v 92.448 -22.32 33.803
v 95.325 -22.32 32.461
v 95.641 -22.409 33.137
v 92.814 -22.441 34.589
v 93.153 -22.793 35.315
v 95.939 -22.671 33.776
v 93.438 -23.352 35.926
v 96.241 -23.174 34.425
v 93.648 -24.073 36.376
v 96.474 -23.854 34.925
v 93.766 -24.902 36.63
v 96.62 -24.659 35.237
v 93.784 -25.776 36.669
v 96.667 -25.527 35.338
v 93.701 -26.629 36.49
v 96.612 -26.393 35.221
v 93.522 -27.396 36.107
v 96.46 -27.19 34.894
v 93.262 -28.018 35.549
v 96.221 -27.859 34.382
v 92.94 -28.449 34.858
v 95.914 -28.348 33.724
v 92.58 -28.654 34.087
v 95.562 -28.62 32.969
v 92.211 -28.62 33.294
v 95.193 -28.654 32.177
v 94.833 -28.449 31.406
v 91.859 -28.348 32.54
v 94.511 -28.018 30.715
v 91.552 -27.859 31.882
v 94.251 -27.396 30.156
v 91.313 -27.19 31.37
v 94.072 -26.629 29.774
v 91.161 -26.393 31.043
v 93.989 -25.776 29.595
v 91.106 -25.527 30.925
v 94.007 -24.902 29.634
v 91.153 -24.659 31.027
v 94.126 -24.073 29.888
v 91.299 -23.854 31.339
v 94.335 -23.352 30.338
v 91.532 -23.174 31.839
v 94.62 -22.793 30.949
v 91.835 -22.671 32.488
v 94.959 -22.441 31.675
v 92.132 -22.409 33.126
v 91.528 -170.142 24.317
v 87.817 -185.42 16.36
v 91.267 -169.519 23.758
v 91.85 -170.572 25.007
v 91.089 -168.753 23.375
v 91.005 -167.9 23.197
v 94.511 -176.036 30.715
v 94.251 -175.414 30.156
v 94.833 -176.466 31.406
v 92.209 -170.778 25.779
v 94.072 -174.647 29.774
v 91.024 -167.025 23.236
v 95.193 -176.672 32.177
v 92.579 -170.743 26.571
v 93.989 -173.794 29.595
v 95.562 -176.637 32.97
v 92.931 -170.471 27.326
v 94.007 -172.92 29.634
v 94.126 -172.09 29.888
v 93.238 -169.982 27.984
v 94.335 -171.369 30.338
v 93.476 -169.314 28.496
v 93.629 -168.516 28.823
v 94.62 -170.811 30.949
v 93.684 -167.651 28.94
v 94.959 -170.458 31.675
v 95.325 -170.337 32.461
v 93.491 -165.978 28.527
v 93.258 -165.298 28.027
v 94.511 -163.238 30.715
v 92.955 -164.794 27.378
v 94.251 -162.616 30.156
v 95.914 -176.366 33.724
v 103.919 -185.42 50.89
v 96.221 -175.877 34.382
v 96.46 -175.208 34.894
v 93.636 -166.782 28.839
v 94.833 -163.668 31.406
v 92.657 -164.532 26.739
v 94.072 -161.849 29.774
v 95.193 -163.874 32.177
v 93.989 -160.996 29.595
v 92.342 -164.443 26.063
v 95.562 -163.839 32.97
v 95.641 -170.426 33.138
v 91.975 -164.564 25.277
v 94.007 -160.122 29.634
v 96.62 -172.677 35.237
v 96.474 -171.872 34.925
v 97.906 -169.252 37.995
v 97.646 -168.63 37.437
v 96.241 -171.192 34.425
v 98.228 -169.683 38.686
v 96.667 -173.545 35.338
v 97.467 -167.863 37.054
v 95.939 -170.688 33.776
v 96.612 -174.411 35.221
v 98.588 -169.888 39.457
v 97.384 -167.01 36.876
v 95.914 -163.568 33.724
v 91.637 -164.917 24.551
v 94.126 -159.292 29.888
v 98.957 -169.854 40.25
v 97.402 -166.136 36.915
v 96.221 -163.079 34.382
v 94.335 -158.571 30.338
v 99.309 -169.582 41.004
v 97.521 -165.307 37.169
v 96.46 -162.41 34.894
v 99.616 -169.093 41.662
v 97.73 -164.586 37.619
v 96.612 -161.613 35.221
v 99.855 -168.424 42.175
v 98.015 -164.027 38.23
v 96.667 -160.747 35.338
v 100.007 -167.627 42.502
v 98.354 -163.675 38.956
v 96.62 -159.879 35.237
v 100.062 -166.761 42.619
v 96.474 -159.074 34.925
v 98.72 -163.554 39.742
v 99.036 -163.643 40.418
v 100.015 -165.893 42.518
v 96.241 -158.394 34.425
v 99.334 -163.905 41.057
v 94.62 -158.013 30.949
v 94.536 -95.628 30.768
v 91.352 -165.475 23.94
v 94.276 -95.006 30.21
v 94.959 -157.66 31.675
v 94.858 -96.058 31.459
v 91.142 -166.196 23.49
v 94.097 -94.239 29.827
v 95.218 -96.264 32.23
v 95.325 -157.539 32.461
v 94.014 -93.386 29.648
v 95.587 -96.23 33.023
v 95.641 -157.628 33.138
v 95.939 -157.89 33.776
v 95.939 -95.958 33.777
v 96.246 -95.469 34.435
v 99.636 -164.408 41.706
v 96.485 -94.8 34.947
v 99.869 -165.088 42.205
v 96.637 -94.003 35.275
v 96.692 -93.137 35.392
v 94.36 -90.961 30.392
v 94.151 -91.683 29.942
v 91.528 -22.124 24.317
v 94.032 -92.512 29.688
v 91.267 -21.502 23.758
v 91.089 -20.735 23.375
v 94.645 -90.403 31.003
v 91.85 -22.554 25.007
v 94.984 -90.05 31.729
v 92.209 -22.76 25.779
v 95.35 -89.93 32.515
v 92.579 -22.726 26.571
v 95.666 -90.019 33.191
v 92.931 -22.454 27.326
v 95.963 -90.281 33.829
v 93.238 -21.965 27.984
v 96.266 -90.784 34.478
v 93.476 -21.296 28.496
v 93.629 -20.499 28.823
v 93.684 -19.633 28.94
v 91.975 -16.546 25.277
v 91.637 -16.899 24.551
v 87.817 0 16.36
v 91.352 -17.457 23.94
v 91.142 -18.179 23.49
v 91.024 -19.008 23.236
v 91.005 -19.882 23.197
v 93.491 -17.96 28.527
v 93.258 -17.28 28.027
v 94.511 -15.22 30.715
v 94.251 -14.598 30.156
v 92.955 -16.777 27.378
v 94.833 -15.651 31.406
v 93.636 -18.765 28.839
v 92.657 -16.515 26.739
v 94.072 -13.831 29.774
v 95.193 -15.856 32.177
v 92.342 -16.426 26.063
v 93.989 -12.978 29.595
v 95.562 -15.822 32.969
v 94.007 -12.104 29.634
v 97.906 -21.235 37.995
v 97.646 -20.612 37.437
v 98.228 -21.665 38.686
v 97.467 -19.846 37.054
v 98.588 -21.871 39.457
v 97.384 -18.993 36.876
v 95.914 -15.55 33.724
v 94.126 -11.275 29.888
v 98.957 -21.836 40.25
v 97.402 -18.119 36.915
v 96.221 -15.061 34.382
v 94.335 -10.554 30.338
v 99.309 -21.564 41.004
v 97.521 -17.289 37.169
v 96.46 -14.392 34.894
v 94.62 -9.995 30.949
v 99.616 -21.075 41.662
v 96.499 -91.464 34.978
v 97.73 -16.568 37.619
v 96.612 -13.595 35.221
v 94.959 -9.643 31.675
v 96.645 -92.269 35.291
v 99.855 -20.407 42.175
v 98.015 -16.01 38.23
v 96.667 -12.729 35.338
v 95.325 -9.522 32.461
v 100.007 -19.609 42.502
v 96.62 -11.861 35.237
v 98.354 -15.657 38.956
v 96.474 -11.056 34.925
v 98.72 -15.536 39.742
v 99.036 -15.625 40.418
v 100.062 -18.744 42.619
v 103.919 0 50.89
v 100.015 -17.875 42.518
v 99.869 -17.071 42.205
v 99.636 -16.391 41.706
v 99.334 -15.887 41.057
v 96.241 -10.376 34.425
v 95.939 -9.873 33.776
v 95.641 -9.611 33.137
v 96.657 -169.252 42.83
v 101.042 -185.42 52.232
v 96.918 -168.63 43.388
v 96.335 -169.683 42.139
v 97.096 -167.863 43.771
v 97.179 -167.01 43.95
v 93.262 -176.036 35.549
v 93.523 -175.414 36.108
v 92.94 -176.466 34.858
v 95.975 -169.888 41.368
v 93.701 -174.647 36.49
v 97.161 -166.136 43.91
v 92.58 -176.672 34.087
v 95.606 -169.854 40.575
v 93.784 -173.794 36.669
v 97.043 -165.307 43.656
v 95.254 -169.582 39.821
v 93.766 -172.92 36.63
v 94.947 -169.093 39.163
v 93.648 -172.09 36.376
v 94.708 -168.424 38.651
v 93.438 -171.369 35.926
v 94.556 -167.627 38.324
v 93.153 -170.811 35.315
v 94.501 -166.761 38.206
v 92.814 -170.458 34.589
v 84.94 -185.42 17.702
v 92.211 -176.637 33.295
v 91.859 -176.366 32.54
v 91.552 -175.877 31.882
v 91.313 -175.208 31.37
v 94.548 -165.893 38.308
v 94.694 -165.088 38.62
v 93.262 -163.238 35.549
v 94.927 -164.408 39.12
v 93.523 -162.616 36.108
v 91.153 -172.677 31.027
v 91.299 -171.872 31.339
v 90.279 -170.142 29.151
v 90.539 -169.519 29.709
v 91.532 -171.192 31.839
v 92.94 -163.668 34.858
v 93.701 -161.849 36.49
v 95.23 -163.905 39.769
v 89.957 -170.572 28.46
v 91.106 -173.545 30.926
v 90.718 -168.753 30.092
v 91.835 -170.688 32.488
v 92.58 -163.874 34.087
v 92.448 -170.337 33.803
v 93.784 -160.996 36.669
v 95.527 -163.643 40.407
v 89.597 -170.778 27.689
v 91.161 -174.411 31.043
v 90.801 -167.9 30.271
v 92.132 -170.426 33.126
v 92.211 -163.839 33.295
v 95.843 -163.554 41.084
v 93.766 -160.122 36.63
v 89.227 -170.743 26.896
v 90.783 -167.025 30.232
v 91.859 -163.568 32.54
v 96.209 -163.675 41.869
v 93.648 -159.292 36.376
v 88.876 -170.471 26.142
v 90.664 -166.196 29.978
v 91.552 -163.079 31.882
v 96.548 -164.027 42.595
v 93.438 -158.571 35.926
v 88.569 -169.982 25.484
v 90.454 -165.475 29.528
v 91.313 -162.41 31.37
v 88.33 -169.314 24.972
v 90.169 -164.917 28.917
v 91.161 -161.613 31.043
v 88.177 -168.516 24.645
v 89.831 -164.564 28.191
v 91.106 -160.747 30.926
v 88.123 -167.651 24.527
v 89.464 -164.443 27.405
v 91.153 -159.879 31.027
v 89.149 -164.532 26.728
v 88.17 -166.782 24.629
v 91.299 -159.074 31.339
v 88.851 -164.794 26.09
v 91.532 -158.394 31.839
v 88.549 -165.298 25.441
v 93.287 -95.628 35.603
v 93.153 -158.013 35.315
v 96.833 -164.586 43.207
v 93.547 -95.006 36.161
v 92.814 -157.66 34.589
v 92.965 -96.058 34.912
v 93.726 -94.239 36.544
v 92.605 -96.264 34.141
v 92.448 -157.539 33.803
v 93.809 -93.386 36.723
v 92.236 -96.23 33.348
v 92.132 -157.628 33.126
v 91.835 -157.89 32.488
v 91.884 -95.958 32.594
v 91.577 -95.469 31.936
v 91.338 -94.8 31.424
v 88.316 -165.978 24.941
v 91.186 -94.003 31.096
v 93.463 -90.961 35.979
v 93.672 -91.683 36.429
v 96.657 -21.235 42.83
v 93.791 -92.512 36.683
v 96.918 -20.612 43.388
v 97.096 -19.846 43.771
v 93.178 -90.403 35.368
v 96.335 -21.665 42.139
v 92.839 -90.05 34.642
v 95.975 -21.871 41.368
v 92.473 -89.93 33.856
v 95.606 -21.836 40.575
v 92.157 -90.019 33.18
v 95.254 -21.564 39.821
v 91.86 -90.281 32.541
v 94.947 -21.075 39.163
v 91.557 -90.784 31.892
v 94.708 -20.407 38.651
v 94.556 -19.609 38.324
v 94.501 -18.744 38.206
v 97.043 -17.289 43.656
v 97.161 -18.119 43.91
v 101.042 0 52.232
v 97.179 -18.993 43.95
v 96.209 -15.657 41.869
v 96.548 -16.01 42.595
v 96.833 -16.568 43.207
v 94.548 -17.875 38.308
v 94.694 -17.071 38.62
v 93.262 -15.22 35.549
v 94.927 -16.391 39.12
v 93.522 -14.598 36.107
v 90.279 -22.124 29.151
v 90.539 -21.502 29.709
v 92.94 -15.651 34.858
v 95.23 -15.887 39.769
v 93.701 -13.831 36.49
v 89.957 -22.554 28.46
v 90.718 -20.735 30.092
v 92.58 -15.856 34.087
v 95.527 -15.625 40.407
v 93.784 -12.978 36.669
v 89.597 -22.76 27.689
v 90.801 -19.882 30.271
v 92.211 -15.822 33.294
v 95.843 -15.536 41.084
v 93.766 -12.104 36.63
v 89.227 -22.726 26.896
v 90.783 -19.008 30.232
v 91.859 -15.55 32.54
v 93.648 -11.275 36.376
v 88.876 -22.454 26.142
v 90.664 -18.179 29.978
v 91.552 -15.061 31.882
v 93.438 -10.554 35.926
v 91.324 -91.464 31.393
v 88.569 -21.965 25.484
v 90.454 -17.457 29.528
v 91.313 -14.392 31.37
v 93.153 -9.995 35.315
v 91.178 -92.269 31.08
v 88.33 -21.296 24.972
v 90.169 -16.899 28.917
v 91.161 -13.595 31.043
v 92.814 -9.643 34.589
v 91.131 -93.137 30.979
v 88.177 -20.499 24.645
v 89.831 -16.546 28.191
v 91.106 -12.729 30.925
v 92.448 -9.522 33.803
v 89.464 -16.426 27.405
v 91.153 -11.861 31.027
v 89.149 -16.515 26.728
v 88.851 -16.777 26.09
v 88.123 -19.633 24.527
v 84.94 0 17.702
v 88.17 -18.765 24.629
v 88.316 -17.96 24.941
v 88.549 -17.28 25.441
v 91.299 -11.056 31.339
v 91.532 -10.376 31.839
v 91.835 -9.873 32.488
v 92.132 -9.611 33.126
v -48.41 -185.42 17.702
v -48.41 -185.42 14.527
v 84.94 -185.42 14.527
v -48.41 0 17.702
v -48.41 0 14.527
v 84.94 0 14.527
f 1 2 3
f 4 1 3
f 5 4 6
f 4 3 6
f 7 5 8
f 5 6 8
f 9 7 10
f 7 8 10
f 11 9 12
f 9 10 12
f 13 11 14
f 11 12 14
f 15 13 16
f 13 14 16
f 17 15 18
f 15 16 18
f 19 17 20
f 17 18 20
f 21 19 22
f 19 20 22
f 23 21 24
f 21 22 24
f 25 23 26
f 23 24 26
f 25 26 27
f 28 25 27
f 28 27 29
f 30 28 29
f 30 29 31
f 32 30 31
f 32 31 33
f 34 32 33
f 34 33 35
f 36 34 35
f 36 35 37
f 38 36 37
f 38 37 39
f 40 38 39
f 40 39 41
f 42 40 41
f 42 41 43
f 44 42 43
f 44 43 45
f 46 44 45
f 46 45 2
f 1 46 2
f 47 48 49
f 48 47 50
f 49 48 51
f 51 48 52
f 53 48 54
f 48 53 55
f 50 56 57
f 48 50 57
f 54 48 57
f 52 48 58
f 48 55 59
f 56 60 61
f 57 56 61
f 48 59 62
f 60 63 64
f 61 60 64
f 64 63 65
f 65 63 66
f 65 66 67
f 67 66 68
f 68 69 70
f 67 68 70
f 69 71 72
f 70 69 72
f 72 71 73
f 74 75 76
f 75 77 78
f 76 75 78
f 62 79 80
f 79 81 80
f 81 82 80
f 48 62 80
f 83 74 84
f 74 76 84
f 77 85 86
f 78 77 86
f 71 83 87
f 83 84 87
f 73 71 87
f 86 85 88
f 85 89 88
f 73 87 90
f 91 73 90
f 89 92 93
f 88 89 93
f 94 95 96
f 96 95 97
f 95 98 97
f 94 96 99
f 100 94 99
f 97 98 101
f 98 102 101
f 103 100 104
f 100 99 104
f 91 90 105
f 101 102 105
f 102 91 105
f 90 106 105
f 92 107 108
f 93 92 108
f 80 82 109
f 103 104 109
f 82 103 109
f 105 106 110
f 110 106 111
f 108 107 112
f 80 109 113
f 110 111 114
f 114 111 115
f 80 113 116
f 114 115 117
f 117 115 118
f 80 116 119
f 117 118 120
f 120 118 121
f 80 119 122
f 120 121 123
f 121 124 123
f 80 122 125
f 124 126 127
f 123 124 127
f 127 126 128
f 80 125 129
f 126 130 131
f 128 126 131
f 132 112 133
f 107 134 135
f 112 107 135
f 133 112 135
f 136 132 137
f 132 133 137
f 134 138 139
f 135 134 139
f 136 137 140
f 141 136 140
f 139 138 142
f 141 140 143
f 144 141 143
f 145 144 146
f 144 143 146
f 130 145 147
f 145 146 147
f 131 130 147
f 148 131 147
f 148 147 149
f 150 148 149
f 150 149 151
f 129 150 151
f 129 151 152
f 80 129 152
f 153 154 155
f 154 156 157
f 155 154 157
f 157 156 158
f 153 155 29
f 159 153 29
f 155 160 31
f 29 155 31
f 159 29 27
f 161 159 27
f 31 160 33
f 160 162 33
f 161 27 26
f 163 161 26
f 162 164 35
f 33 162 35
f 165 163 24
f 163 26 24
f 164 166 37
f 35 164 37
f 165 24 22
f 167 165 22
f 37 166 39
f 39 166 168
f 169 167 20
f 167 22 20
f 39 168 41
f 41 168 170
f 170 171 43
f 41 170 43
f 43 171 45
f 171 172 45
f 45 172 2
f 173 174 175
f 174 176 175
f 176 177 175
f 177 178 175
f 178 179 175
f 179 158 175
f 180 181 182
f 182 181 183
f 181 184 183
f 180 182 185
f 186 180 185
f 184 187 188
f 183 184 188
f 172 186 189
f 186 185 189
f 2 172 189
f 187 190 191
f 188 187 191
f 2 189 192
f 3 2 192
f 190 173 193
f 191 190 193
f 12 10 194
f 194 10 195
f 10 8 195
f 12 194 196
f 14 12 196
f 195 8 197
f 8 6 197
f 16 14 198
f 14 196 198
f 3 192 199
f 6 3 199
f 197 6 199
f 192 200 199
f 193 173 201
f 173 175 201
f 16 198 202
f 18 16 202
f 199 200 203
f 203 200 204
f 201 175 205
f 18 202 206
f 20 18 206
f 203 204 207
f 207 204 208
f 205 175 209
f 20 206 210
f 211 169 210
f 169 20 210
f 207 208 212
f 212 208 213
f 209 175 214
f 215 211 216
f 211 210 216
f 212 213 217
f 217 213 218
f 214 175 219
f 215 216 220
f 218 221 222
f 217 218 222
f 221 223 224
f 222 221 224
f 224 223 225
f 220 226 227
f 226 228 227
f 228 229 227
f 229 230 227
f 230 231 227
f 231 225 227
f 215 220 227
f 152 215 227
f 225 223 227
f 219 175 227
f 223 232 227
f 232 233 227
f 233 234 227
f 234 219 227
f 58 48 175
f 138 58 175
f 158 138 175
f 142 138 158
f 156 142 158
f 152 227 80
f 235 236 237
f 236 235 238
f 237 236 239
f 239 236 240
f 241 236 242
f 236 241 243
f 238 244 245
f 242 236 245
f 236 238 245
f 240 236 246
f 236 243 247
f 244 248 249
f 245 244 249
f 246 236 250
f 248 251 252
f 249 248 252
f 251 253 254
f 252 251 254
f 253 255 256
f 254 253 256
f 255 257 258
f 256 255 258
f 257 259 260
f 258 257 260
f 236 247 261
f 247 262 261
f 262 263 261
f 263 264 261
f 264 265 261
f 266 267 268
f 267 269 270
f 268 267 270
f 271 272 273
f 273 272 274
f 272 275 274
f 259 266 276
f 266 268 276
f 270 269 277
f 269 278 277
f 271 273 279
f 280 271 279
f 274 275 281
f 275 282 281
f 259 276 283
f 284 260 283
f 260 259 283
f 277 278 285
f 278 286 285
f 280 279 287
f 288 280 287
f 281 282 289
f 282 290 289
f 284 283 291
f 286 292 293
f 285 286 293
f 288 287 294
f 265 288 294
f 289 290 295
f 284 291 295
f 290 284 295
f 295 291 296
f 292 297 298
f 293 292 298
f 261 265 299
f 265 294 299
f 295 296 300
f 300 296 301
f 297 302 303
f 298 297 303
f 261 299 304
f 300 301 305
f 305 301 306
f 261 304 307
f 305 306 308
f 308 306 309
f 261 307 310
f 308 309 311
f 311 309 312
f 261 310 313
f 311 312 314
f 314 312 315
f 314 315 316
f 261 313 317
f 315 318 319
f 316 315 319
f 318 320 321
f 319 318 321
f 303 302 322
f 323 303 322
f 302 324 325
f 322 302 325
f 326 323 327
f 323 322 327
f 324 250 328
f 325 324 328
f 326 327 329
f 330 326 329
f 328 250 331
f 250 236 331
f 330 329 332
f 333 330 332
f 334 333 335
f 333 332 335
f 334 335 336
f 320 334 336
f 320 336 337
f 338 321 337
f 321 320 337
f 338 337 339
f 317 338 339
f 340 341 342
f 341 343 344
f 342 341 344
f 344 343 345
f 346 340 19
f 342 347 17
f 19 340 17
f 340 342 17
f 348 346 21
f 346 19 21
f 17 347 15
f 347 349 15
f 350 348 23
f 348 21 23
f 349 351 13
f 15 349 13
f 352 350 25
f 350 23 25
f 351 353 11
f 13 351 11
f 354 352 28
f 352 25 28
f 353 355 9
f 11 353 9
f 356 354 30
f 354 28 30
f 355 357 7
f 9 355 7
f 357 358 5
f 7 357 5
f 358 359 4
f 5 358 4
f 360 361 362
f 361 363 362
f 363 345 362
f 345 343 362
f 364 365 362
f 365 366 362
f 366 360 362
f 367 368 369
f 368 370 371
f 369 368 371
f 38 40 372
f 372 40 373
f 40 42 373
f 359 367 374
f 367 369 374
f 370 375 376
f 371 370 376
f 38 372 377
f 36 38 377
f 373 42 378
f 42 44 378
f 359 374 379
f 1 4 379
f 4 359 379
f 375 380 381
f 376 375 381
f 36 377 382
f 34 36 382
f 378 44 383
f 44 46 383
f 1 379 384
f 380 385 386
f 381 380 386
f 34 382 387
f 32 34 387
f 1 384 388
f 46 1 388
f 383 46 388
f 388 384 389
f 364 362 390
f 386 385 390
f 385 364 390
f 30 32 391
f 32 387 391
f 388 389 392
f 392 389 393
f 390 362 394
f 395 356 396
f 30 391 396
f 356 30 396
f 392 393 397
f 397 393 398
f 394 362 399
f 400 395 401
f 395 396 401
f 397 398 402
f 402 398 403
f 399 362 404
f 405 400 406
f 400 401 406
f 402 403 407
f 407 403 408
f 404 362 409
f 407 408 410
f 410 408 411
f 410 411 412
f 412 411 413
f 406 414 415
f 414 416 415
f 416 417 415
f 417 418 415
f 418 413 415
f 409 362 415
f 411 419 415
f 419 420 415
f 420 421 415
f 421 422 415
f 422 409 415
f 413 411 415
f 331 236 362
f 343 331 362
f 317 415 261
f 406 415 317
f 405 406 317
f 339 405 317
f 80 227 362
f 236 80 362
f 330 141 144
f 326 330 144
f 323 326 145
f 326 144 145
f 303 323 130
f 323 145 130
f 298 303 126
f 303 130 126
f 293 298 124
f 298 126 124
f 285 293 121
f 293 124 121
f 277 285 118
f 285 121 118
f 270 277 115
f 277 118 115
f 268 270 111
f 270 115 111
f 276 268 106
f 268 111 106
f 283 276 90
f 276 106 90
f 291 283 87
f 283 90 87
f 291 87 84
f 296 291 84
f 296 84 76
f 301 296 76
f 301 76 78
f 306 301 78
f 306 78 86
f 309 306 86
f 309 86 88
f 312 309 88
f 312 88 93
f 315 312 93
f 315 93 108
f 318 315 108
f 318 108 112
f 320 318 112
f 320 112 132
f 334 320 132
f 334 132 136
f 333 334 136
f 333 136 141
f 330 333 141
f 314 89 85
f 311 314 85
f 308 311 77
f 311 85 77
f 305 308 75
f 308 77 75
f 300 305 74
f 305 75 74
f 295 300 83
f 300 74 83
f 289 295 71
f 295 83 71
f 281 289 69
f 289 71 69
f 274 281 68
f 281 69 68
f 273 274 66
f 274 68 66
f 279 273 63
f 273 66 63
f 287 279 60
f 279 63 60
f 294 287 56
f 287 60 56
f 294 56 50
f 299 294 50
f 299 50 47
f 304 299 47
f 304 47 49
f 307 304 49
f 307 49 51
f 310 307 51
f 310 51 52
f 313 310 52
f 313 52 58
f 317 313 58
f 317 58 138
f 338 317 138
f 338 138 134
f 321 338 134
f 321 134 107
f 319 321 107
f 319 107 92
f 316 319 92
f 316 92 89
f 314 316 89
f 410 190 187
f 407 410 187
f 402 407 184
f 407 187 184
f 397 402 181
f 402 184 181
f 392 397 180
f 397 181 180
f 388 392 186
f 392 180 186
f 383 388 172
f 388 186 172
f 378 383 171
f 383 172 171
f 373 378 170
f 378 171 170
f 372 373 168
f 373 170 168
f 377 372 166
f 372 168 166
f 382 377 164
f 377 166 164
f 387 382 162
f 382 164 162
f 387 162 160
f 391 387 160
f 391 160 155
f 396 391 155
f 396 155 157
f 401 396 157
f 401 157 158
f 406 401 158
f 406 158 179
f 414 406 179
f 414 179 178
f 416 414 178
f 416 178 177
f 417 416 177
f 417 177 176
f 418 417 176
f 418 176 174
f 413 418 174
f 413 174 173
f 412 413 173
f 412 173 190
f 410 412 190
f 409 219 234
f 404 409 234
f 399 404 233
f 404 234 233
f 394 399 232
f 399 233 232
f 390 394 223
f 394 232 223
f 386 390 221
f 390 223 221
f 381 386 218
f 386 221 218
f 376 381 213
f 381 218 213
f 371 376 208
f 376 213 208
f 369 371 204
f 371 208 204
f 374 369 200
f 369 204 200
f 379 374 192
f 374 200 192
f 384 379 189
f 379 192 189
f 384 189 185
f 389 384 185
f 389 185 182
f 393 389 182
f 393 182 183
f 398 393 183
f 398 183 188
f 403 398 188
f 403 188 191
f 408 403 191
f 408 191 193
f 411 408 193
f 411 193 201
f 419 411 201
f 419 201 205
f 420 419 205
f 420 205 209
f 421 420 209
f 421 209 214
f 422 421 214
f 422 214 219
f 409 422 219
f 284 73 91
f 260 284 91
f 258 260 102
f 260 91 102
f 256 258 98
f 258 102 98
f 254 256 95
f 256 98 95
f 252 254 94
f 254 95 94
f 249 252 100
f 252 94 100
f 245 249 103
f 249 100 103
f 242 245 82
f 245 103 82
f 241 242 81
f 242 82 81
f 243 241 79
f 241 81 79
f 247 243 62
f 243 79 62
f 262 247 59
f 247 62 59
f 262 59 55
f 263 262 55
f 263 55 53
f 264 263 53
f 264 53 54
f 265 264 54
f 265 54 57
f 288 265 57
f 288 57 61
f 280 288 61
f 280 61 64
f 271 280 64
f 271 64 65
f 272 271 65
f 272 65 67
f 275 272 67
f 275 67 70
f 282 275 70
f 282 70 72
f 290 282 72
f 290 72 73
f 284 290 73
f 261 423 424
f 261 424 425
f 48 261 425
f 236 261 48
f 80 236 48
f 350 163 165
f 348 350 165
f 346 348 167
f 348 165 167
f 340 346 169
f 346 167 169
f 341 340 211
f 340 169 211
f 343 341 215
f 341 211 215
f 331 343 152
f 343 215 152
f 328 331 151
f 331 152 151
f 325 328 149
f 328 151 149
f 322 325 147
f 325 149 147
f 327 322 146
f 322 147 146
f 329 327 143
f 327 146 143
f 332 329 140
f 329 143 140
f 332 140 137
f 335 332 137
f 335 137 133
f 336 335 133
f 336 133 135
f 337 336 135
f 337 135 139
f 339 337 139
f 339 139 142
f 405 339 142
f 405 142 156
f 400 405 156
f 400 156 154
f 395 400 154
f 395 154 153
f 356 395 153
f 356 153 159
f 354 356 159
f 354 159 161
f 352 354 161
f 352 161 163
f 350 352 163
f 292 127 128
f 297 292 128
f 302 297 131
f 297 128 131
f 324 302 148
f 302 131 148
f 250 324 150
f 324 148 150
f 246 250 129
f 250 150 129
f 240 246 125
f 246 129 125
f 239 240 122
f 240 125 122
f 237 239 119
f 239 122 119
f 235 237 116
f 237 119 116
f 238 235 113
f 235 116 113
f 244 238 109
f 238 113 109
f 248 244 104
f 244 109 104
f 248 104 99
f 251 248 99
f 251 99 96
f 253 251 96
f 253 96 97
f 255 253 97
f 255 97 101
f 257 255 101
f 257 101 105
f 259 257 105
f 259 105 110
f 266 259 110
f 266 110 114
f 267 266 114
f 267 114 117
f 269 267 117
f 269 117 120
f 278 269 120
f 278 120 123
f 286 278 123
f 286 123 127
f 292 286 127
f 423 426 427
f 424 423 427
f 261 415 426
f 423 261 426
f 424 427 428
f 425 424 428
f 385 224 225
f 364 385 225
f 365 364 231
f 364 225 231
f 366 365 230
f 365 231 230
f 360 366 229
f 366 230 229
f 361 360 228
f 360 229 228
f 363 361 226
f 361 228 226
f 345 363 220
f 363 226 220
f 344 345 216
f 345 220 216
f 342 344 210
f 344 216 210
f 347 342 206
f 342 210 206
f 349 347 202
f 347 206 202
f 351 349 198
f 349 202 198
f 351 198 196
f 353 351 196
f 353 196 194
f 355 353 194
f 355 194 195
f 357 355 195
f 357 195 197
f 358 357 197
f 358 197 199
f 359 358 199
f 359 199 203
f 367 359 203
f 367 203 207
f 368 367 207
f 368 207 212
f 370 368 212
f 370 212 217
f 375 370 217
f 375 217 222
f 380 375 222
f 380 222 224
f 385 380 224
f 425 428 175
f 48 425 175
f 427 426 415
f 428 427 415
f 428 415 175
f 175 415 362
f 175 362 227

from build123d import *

# Parameters (mm, degrees)
F1_DEPTH = 185.42
F3_D     = 6.35
F4_D     = 6.35
F5_D     = 6.35
F6_D     = 6.35
F7_D     = 6.35
F8_D     = 6.35
F9_D     = 6.35
F10_D    = 6.35
F11_D    = 6.35


with BuildPart() as f1:
    # F0 (on Front) → F1 (new body)
    with BuildSketch(Plane.XZ):
        Polygon((84.939852, 17.701955), (-48.410148, 17.701955), (-48.410148, 14.526955), (84.939852, 14.526955), (87.81738, 16.360142), (103.919135, 50.890469), (101.041608, 52.232282), align=None)
    extrude(amount=F1_DEPTH)

    # F3 (through all)
    with Locations(Plane(origin=(62.988826, 0, -29.372172), x_dir=(0, -1, 0), z_dir=(-0.906308, 0, 0.422618))):
        with Locations((18.711276, 77.739262)):
            Hole(F3_D / 2)

    # F4 (through all)
    with Locations(Plane(origin=(62.988826, 0, -29.372172), x_dir=(0, -1, 0), z_dir=(-0.906308, 0, 0.422618))):
        with Locations((12.696845, 69.705941)):
            Hole(F4_D / 2)

    # F5 (through all)
    with Locations(Plane(origin=(62.988826, 0, -29.372172), x_dir=(0, -1, 0), z_dir=(-0.906308, 0, 0.422618))):
        with Locations((19.600639, 62.646478)):
            Hole(F5_D / 2)

    # F6 (through all)
    with Locations(Plane(origin=(62.988826, 0, -29.372172), x_dir=(0, -1, 0), z_dir=(-0.906308, 0, 0.422618))):
        with Locations((25.494844, 69.705941)):
            Hole(F6_D / 2)

    # F7 (through all)
    with Locations(Plane(origin=(62.988826, 0, -29.372172), x_dir=(0, -1, 0), z_dir=(-0.906308, 0, 0.422618))):
        with Locations((166.728864, 77.739262)):
            Hole(F7_D / 2)

    # F8 (through all)
    with Locations(Plane(origin=(62.988826, 0, -29.372172), x_dir=(0, -1, 0), z_dir=(-0.906308, 0, 0.422618))):
        with Locations((160.714432, 69.705987)):
            Hole(F8_D / 2)

    # F9 (through all)
    with Locations(Plane(origin=(62.988826, 0, -29.372172), x_dir=(0, -1, 0), z_dir=(-0.906308, 0, 0.422618))):
        with Locations((167.618226, 62.646478)):
            Hole(F9_D / 2)

    # F10 (through all)
    with Locations(Plane(origin=(62.988826, 0, -29.372172), x_dir=(0, -1, 0), z_dir=(-0.906308, 0, 0.422618))):
        with Locations((173.512431, 69.705987)):
            Hole(F10_D / 2)

    # F11 (through all)
    with Locations(Plane(origin=(62.988826, 0, -29.372172), x_dir=(0, -1, 0), z_dir=(-0.906308, 0, 0.422618))):
        with Locations((93.104638, 69.76501)):
            Hole(F11_D / 2)


solid = f1.part
